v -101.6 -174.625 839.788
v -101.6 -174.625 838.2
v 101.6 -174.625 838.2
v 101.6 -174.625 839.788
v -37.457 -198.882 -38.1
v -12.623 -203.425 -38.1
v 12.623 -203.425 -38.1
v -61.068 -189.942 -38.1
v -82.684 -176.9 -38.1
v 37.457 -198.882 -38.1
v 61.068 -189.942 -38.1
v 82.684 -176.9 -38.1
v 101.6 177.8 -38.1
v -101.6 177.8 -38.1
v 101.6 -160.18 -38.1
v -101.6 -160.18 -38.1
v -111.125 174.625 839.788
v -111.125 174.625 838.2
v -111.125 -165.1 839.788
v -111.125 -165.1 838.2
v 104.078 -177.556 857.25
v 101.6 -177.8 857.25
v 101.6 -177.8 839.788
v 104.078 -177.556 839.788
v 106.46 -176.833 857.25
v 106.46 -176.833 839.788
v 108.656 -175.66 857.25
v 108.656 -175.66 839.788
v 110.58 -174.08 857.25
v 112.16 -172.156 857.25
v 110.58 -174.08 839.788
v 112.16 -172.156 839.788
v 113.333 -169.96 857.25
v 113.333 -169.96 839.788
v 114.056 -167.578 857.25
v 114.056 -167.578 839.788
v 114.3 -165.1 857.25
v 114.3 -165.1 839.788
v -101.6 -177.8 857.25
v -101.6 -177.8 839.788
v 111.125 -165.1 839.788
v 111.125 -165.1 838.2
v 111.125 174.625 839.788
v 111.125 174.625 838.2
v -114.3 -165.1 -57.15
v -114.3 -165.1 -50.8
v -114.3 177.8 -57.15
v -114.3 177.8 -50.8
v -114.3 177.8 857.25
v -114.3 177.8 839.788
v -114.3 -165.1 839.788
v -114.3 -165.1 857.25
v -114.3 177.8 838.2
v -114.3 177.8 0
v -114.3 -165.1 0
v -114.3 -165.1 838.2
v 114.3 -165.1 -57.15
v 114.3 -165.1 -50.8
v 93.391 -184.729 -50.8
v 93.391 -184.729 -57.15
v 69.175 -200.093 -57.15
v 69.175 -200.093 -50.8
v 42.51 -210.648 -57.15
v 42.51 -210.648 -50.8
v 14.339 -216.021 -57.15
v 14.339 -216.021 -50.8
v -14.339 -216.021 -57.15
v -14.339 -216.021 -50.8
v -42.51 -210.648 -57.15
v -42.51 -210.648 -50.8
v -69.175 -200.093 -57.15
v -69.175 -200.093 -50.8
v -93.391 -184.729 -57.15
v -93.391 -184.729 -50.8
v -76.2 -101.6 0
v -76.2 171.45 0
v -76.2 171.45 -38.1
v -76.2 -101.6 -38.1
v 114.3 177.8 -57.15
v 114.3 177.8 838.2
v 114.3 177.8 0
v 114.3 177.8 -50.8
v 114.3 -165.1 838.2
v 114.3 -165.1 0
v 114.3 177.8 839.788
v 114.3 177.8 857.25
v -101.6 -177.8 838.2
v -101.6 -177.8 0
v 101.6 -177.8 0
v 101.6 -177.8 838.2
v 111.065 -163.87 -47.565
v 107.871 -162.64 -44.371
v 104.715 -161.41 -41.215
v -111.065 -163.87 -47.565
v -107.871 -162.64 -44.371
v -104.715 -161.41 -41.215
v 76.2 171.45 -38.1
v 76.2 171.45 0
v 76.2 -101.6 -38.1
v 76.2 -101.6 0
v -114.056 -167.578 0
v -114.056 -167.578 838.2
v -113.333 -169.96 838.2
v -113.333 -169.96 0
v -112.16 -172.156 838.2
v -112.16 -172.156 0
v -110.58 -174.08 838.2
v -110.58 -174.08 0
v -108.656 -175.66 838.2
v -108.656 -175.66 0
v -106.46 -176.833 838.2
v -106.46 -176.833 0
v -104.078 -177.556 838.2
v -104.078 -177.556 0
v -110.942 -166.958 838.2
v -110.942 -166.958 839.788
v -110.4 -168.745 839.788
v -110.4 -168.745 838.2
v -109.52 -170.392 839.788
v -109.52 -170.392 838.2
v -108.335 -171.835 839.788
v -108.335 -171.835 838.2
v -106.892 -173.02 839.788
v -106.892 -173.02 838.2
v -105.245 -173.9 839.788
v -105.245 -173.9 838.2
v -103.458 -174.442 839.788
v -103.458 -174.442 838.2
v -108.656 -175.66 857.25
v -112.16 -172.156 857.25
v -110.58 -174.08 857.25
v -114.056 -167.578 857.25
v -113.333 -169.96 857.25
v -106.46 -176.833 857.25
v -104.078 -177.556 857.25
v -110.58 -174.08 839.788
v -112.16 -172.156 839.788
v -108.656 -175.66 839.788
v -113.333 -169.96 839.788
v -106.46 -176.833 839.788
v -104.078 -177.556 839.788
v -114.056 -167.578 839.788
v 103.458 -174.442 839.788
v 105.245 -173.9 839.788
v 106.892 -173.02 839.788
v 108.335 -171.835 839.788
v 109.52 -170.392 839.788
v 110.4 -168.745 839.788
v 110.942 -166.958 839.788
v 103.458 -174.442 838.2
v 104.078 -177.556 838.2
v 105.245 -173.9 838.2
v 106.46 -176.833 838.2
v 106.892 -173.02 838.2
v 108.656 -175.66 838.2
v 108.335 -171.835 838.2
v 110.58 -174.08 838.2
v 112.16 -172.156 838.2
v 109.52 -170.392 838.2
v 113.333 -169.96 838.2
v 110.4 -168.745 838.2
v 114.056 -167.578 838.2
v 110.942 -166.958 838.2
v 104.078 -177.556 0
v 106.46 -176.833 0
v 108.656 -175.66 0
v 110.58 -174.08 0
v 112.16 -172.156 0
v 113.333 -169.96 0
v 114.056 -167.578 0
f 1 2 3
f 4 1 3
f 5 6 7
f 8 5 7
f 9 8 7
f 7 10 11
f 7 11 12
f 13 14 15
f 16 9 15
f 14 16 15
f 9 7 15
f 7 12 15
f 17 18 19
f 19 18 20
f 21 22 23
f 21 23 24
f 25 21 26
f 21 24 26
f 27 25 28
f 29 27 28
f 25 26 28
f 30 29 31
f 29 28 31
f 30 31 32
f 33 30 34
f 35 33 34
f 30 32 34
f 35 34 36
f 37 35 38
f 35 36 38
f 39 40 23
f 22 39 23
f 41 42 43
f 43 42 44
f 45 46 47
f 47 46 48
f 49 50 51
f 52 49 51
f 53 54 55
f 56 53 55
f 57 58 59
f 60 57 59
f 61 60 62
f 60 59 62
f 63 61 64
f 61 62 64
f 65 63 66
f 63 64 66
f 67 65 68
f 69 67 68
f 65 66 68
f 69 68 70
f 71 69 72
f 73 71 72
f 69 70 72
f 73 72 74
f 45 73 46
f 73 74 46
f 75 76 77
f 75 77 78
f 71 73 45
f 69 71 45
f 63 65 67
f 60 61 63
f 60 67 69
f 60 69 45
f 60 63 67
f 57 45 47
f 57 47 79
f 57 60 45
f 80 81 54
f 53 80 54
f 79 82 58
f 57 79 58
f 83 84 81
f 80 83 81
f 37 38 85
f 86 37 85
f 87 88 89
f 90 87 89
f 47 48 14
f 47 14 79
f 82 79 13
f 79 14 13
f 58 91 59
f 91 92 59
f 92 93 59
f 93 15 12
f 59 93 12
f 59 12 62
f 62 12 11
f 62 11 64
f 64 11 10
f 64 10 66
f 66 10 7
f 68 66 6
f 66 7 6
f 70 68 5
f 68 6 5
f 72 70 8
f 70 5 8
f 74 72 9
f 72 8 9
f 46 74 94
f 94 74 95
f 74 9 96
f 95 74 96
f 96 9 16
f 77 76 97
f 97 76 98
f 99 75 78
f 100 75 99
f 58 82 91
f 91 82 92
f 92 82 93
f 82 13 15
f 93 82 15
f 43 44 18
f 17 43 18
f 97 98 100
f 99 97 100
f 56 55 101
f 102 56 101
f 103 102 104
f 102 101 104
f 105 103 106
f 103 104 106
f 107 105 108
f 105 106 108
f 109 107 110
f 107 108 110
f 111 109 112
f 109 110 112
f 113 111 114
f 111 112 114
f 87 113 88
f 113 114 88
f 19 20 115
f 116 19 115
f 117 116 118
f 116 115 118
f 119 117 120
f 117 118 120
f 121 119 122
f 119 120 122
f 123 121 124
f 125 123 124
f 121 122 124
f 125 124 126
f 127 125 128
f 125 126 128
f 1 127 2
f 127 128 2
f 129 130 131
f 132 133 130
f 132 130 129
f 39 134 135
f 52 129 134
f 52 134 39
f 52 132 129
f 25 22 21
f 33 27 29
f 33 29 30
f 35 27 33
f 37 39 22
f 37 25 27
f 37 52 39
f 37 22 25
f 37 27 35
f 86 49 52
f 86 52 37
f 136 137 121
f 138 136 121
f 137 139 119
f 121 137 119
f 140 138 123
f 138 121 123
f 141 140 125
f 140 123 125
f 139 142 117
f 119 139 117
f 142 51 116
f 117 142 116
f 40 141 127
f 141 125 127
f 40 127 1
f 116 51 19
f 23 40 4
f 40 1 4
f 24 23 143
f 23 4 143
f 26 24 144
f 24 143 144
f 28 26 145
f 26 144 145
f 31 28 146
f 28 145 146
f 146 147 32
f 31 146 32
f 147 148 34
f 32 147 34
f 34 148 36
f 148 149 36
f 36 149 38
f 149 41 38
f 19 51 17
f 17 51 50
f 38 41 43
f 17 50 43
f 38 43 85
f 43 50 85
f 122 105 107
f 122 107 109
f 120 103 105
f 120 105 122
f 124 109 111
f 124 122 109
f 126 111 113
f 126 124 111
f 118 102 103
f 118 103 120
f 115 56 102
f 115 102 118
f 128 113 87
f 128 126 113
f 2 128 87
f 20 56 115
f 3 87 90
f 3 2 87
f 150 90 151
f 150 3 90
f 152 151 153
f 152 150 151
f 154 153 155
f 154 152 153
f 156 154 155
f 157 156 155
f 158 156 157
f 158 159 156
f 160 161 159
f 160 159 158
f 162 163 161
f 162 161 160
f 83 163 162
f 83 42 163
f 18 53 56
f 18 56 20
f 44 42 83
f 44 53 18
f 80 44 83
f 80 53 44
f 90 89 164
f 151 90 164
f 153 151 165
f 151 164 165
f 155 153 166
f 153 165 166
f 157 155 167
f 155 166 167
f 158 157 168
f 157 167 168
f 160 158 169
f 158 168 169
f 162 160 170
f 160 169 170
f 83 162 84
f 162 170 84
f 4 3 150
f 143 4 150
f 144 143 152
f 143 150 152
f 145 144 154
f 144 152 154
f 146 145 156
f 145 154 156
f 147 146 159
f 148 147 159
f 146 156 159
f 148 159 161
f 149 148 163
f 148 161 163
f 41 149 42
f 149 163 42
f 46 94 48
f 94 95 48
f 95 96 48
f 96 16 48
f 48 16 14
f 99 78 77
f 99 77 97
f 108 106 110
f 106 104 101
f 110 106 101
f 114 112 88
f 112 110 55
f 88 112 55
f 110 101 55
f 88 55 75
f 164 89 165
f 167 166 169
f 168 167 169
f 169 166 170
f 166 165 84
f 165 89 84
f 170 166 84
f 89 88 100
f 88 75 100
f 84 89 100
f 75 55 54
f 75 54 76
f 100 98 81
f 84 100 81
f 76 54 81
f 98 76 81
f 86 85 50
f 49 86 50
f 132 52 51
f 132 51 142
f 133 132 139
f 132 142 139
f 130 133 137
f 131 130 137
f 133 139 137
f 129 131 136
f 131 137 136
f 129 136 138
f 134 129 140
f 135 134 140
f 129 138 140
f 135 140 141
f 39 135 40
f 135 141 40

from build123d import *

# Parameters (mm, degrees)
F1_DEPTH = 838.2
F3_DEPTH = 1.5875
F5_DEPTH = 17.4625
F6_W     = 152.4
F6_H     = 273.05
F7_DEPTH = 38.1
F8_W     = 152.4
F8_H     = 273.05
F9_DEPTH = 19.05
F10_SIZE = 12.7


with BuildPart() as f1:
    # F0 (on Top) → F1 (new body)
    with BuildSketch(Plane.XY):
        with BuildLine():
            Line((-114.3, 177.8), (-114.3, -165.1))
            ThreePointArc((-114.3, -165.1), (-110.5802561211, -174.0802561211), (-101.6, -177.8))
            Line((-101.6, -177.8), (101.6, -177.8))
            ThreePointArc((101.6, -177.8), (110.5802561211, -174.0802561211), (114.3, -165.1))
            Line((114.3, -165.1), (114.3, 177.8))
            Line((114.3, 177.8), (-114.3, 177.8))
        make_face()
    extrude(amount=F1_DEPTH)

    # F2 (on face) → F3 (join)
    with BuildSketch(Plane.XY.offset(838.2)):
        with BuildLine():
            Line((-111.125, 174.625), (-111.125, -165.1))
            ThreePointArc((-111.125, -165.1), (-108.3351920908, -171.8351920908), (-101.6, -174.625))
            Line((-101.6, -174.625), (101.6, -174.625))
            ThreePointArc((101.6, -174.625), (108.3351920908, -171.8351920908), (111.125, -165.1))
            Line((111.125, -165.1), (111.125, 174.625))
            Line((111.125, 174.625), (-111.125, 174.625))
        make_face()
    extrude(amount=F3_DEPTH)

    # F4 (on face) → F5 (join)
    with BuildSketch(Plane.XY.offset(839.7875)):
        with BuildLine():
            Line((-101.6, -177.8), (101.6, -177.8))
            ThreePointArc((101.6, -177.8), (110.5802561211, -174.0802561211), (114.3, -165.1))
            Line((114.3, -165.1), (114.3, 177.8))
            Line((114.3, 177.8), (-114.3, 177.8))
            Line((-114.3, 177.8), (-114.3, -165.1))
            ThreePointArc((-114.3, -165.1), (-110.5802561211, -174.0802561211), (-101.6, -177.8))
        make_face()
    extrude(amount=F5_DEPTH)

    # F6 (on face) → F7 (join)
    with BuildSketch(Plane(origin=(0, 0, 0), x_dir=(1, 0, 0), z_dir=(0, 0, -1))):
        with Locations((0, -34.925)):
            Rectangle(F6_W, F6_H)
    extrude(amount=F7_DEPTH)


with BuildPart() as f9:
    # F8 (on face) → F9 (new body)
    with BuildSketch(Plane(origin=(0, 0, -38.1), x_dir=(1, 0, 0), z_dir=(0, 0, -1))):
        with BuildLine():
            Line((-114.3, 165.1), (-114.3, -177.8))
            Line((-114.3, -177.8), (114.3, -177.8))
            Line((114.3, -177.8), (114.3, 165.1))
            ThreePointArc((114.3, 165.1), (0, 216.6968750484), (-114.3, 165.1))
        make_face()
        with Locations((0, -34.925)):
            Rectangle(F8_W, F8_H, mode=Mode.SUBTRACT)
        with Locations((0, -34.925)):
            Rectangle(F8_W, F8_H)
    extrude(amount=F9_DEPTH)

    # F10
    f10_edges = [f9.edges().sort_by_distance(p)[0] for p in [
        (-114.3, 6.35, -38.1),
        (0, -216.696875, -38.1),
        (114.3, 6.35, -38.1),
    ]]
    chamfer(f10_edges, length=F10_SIZE)


solid = Compound([f1.part, f9.part])
